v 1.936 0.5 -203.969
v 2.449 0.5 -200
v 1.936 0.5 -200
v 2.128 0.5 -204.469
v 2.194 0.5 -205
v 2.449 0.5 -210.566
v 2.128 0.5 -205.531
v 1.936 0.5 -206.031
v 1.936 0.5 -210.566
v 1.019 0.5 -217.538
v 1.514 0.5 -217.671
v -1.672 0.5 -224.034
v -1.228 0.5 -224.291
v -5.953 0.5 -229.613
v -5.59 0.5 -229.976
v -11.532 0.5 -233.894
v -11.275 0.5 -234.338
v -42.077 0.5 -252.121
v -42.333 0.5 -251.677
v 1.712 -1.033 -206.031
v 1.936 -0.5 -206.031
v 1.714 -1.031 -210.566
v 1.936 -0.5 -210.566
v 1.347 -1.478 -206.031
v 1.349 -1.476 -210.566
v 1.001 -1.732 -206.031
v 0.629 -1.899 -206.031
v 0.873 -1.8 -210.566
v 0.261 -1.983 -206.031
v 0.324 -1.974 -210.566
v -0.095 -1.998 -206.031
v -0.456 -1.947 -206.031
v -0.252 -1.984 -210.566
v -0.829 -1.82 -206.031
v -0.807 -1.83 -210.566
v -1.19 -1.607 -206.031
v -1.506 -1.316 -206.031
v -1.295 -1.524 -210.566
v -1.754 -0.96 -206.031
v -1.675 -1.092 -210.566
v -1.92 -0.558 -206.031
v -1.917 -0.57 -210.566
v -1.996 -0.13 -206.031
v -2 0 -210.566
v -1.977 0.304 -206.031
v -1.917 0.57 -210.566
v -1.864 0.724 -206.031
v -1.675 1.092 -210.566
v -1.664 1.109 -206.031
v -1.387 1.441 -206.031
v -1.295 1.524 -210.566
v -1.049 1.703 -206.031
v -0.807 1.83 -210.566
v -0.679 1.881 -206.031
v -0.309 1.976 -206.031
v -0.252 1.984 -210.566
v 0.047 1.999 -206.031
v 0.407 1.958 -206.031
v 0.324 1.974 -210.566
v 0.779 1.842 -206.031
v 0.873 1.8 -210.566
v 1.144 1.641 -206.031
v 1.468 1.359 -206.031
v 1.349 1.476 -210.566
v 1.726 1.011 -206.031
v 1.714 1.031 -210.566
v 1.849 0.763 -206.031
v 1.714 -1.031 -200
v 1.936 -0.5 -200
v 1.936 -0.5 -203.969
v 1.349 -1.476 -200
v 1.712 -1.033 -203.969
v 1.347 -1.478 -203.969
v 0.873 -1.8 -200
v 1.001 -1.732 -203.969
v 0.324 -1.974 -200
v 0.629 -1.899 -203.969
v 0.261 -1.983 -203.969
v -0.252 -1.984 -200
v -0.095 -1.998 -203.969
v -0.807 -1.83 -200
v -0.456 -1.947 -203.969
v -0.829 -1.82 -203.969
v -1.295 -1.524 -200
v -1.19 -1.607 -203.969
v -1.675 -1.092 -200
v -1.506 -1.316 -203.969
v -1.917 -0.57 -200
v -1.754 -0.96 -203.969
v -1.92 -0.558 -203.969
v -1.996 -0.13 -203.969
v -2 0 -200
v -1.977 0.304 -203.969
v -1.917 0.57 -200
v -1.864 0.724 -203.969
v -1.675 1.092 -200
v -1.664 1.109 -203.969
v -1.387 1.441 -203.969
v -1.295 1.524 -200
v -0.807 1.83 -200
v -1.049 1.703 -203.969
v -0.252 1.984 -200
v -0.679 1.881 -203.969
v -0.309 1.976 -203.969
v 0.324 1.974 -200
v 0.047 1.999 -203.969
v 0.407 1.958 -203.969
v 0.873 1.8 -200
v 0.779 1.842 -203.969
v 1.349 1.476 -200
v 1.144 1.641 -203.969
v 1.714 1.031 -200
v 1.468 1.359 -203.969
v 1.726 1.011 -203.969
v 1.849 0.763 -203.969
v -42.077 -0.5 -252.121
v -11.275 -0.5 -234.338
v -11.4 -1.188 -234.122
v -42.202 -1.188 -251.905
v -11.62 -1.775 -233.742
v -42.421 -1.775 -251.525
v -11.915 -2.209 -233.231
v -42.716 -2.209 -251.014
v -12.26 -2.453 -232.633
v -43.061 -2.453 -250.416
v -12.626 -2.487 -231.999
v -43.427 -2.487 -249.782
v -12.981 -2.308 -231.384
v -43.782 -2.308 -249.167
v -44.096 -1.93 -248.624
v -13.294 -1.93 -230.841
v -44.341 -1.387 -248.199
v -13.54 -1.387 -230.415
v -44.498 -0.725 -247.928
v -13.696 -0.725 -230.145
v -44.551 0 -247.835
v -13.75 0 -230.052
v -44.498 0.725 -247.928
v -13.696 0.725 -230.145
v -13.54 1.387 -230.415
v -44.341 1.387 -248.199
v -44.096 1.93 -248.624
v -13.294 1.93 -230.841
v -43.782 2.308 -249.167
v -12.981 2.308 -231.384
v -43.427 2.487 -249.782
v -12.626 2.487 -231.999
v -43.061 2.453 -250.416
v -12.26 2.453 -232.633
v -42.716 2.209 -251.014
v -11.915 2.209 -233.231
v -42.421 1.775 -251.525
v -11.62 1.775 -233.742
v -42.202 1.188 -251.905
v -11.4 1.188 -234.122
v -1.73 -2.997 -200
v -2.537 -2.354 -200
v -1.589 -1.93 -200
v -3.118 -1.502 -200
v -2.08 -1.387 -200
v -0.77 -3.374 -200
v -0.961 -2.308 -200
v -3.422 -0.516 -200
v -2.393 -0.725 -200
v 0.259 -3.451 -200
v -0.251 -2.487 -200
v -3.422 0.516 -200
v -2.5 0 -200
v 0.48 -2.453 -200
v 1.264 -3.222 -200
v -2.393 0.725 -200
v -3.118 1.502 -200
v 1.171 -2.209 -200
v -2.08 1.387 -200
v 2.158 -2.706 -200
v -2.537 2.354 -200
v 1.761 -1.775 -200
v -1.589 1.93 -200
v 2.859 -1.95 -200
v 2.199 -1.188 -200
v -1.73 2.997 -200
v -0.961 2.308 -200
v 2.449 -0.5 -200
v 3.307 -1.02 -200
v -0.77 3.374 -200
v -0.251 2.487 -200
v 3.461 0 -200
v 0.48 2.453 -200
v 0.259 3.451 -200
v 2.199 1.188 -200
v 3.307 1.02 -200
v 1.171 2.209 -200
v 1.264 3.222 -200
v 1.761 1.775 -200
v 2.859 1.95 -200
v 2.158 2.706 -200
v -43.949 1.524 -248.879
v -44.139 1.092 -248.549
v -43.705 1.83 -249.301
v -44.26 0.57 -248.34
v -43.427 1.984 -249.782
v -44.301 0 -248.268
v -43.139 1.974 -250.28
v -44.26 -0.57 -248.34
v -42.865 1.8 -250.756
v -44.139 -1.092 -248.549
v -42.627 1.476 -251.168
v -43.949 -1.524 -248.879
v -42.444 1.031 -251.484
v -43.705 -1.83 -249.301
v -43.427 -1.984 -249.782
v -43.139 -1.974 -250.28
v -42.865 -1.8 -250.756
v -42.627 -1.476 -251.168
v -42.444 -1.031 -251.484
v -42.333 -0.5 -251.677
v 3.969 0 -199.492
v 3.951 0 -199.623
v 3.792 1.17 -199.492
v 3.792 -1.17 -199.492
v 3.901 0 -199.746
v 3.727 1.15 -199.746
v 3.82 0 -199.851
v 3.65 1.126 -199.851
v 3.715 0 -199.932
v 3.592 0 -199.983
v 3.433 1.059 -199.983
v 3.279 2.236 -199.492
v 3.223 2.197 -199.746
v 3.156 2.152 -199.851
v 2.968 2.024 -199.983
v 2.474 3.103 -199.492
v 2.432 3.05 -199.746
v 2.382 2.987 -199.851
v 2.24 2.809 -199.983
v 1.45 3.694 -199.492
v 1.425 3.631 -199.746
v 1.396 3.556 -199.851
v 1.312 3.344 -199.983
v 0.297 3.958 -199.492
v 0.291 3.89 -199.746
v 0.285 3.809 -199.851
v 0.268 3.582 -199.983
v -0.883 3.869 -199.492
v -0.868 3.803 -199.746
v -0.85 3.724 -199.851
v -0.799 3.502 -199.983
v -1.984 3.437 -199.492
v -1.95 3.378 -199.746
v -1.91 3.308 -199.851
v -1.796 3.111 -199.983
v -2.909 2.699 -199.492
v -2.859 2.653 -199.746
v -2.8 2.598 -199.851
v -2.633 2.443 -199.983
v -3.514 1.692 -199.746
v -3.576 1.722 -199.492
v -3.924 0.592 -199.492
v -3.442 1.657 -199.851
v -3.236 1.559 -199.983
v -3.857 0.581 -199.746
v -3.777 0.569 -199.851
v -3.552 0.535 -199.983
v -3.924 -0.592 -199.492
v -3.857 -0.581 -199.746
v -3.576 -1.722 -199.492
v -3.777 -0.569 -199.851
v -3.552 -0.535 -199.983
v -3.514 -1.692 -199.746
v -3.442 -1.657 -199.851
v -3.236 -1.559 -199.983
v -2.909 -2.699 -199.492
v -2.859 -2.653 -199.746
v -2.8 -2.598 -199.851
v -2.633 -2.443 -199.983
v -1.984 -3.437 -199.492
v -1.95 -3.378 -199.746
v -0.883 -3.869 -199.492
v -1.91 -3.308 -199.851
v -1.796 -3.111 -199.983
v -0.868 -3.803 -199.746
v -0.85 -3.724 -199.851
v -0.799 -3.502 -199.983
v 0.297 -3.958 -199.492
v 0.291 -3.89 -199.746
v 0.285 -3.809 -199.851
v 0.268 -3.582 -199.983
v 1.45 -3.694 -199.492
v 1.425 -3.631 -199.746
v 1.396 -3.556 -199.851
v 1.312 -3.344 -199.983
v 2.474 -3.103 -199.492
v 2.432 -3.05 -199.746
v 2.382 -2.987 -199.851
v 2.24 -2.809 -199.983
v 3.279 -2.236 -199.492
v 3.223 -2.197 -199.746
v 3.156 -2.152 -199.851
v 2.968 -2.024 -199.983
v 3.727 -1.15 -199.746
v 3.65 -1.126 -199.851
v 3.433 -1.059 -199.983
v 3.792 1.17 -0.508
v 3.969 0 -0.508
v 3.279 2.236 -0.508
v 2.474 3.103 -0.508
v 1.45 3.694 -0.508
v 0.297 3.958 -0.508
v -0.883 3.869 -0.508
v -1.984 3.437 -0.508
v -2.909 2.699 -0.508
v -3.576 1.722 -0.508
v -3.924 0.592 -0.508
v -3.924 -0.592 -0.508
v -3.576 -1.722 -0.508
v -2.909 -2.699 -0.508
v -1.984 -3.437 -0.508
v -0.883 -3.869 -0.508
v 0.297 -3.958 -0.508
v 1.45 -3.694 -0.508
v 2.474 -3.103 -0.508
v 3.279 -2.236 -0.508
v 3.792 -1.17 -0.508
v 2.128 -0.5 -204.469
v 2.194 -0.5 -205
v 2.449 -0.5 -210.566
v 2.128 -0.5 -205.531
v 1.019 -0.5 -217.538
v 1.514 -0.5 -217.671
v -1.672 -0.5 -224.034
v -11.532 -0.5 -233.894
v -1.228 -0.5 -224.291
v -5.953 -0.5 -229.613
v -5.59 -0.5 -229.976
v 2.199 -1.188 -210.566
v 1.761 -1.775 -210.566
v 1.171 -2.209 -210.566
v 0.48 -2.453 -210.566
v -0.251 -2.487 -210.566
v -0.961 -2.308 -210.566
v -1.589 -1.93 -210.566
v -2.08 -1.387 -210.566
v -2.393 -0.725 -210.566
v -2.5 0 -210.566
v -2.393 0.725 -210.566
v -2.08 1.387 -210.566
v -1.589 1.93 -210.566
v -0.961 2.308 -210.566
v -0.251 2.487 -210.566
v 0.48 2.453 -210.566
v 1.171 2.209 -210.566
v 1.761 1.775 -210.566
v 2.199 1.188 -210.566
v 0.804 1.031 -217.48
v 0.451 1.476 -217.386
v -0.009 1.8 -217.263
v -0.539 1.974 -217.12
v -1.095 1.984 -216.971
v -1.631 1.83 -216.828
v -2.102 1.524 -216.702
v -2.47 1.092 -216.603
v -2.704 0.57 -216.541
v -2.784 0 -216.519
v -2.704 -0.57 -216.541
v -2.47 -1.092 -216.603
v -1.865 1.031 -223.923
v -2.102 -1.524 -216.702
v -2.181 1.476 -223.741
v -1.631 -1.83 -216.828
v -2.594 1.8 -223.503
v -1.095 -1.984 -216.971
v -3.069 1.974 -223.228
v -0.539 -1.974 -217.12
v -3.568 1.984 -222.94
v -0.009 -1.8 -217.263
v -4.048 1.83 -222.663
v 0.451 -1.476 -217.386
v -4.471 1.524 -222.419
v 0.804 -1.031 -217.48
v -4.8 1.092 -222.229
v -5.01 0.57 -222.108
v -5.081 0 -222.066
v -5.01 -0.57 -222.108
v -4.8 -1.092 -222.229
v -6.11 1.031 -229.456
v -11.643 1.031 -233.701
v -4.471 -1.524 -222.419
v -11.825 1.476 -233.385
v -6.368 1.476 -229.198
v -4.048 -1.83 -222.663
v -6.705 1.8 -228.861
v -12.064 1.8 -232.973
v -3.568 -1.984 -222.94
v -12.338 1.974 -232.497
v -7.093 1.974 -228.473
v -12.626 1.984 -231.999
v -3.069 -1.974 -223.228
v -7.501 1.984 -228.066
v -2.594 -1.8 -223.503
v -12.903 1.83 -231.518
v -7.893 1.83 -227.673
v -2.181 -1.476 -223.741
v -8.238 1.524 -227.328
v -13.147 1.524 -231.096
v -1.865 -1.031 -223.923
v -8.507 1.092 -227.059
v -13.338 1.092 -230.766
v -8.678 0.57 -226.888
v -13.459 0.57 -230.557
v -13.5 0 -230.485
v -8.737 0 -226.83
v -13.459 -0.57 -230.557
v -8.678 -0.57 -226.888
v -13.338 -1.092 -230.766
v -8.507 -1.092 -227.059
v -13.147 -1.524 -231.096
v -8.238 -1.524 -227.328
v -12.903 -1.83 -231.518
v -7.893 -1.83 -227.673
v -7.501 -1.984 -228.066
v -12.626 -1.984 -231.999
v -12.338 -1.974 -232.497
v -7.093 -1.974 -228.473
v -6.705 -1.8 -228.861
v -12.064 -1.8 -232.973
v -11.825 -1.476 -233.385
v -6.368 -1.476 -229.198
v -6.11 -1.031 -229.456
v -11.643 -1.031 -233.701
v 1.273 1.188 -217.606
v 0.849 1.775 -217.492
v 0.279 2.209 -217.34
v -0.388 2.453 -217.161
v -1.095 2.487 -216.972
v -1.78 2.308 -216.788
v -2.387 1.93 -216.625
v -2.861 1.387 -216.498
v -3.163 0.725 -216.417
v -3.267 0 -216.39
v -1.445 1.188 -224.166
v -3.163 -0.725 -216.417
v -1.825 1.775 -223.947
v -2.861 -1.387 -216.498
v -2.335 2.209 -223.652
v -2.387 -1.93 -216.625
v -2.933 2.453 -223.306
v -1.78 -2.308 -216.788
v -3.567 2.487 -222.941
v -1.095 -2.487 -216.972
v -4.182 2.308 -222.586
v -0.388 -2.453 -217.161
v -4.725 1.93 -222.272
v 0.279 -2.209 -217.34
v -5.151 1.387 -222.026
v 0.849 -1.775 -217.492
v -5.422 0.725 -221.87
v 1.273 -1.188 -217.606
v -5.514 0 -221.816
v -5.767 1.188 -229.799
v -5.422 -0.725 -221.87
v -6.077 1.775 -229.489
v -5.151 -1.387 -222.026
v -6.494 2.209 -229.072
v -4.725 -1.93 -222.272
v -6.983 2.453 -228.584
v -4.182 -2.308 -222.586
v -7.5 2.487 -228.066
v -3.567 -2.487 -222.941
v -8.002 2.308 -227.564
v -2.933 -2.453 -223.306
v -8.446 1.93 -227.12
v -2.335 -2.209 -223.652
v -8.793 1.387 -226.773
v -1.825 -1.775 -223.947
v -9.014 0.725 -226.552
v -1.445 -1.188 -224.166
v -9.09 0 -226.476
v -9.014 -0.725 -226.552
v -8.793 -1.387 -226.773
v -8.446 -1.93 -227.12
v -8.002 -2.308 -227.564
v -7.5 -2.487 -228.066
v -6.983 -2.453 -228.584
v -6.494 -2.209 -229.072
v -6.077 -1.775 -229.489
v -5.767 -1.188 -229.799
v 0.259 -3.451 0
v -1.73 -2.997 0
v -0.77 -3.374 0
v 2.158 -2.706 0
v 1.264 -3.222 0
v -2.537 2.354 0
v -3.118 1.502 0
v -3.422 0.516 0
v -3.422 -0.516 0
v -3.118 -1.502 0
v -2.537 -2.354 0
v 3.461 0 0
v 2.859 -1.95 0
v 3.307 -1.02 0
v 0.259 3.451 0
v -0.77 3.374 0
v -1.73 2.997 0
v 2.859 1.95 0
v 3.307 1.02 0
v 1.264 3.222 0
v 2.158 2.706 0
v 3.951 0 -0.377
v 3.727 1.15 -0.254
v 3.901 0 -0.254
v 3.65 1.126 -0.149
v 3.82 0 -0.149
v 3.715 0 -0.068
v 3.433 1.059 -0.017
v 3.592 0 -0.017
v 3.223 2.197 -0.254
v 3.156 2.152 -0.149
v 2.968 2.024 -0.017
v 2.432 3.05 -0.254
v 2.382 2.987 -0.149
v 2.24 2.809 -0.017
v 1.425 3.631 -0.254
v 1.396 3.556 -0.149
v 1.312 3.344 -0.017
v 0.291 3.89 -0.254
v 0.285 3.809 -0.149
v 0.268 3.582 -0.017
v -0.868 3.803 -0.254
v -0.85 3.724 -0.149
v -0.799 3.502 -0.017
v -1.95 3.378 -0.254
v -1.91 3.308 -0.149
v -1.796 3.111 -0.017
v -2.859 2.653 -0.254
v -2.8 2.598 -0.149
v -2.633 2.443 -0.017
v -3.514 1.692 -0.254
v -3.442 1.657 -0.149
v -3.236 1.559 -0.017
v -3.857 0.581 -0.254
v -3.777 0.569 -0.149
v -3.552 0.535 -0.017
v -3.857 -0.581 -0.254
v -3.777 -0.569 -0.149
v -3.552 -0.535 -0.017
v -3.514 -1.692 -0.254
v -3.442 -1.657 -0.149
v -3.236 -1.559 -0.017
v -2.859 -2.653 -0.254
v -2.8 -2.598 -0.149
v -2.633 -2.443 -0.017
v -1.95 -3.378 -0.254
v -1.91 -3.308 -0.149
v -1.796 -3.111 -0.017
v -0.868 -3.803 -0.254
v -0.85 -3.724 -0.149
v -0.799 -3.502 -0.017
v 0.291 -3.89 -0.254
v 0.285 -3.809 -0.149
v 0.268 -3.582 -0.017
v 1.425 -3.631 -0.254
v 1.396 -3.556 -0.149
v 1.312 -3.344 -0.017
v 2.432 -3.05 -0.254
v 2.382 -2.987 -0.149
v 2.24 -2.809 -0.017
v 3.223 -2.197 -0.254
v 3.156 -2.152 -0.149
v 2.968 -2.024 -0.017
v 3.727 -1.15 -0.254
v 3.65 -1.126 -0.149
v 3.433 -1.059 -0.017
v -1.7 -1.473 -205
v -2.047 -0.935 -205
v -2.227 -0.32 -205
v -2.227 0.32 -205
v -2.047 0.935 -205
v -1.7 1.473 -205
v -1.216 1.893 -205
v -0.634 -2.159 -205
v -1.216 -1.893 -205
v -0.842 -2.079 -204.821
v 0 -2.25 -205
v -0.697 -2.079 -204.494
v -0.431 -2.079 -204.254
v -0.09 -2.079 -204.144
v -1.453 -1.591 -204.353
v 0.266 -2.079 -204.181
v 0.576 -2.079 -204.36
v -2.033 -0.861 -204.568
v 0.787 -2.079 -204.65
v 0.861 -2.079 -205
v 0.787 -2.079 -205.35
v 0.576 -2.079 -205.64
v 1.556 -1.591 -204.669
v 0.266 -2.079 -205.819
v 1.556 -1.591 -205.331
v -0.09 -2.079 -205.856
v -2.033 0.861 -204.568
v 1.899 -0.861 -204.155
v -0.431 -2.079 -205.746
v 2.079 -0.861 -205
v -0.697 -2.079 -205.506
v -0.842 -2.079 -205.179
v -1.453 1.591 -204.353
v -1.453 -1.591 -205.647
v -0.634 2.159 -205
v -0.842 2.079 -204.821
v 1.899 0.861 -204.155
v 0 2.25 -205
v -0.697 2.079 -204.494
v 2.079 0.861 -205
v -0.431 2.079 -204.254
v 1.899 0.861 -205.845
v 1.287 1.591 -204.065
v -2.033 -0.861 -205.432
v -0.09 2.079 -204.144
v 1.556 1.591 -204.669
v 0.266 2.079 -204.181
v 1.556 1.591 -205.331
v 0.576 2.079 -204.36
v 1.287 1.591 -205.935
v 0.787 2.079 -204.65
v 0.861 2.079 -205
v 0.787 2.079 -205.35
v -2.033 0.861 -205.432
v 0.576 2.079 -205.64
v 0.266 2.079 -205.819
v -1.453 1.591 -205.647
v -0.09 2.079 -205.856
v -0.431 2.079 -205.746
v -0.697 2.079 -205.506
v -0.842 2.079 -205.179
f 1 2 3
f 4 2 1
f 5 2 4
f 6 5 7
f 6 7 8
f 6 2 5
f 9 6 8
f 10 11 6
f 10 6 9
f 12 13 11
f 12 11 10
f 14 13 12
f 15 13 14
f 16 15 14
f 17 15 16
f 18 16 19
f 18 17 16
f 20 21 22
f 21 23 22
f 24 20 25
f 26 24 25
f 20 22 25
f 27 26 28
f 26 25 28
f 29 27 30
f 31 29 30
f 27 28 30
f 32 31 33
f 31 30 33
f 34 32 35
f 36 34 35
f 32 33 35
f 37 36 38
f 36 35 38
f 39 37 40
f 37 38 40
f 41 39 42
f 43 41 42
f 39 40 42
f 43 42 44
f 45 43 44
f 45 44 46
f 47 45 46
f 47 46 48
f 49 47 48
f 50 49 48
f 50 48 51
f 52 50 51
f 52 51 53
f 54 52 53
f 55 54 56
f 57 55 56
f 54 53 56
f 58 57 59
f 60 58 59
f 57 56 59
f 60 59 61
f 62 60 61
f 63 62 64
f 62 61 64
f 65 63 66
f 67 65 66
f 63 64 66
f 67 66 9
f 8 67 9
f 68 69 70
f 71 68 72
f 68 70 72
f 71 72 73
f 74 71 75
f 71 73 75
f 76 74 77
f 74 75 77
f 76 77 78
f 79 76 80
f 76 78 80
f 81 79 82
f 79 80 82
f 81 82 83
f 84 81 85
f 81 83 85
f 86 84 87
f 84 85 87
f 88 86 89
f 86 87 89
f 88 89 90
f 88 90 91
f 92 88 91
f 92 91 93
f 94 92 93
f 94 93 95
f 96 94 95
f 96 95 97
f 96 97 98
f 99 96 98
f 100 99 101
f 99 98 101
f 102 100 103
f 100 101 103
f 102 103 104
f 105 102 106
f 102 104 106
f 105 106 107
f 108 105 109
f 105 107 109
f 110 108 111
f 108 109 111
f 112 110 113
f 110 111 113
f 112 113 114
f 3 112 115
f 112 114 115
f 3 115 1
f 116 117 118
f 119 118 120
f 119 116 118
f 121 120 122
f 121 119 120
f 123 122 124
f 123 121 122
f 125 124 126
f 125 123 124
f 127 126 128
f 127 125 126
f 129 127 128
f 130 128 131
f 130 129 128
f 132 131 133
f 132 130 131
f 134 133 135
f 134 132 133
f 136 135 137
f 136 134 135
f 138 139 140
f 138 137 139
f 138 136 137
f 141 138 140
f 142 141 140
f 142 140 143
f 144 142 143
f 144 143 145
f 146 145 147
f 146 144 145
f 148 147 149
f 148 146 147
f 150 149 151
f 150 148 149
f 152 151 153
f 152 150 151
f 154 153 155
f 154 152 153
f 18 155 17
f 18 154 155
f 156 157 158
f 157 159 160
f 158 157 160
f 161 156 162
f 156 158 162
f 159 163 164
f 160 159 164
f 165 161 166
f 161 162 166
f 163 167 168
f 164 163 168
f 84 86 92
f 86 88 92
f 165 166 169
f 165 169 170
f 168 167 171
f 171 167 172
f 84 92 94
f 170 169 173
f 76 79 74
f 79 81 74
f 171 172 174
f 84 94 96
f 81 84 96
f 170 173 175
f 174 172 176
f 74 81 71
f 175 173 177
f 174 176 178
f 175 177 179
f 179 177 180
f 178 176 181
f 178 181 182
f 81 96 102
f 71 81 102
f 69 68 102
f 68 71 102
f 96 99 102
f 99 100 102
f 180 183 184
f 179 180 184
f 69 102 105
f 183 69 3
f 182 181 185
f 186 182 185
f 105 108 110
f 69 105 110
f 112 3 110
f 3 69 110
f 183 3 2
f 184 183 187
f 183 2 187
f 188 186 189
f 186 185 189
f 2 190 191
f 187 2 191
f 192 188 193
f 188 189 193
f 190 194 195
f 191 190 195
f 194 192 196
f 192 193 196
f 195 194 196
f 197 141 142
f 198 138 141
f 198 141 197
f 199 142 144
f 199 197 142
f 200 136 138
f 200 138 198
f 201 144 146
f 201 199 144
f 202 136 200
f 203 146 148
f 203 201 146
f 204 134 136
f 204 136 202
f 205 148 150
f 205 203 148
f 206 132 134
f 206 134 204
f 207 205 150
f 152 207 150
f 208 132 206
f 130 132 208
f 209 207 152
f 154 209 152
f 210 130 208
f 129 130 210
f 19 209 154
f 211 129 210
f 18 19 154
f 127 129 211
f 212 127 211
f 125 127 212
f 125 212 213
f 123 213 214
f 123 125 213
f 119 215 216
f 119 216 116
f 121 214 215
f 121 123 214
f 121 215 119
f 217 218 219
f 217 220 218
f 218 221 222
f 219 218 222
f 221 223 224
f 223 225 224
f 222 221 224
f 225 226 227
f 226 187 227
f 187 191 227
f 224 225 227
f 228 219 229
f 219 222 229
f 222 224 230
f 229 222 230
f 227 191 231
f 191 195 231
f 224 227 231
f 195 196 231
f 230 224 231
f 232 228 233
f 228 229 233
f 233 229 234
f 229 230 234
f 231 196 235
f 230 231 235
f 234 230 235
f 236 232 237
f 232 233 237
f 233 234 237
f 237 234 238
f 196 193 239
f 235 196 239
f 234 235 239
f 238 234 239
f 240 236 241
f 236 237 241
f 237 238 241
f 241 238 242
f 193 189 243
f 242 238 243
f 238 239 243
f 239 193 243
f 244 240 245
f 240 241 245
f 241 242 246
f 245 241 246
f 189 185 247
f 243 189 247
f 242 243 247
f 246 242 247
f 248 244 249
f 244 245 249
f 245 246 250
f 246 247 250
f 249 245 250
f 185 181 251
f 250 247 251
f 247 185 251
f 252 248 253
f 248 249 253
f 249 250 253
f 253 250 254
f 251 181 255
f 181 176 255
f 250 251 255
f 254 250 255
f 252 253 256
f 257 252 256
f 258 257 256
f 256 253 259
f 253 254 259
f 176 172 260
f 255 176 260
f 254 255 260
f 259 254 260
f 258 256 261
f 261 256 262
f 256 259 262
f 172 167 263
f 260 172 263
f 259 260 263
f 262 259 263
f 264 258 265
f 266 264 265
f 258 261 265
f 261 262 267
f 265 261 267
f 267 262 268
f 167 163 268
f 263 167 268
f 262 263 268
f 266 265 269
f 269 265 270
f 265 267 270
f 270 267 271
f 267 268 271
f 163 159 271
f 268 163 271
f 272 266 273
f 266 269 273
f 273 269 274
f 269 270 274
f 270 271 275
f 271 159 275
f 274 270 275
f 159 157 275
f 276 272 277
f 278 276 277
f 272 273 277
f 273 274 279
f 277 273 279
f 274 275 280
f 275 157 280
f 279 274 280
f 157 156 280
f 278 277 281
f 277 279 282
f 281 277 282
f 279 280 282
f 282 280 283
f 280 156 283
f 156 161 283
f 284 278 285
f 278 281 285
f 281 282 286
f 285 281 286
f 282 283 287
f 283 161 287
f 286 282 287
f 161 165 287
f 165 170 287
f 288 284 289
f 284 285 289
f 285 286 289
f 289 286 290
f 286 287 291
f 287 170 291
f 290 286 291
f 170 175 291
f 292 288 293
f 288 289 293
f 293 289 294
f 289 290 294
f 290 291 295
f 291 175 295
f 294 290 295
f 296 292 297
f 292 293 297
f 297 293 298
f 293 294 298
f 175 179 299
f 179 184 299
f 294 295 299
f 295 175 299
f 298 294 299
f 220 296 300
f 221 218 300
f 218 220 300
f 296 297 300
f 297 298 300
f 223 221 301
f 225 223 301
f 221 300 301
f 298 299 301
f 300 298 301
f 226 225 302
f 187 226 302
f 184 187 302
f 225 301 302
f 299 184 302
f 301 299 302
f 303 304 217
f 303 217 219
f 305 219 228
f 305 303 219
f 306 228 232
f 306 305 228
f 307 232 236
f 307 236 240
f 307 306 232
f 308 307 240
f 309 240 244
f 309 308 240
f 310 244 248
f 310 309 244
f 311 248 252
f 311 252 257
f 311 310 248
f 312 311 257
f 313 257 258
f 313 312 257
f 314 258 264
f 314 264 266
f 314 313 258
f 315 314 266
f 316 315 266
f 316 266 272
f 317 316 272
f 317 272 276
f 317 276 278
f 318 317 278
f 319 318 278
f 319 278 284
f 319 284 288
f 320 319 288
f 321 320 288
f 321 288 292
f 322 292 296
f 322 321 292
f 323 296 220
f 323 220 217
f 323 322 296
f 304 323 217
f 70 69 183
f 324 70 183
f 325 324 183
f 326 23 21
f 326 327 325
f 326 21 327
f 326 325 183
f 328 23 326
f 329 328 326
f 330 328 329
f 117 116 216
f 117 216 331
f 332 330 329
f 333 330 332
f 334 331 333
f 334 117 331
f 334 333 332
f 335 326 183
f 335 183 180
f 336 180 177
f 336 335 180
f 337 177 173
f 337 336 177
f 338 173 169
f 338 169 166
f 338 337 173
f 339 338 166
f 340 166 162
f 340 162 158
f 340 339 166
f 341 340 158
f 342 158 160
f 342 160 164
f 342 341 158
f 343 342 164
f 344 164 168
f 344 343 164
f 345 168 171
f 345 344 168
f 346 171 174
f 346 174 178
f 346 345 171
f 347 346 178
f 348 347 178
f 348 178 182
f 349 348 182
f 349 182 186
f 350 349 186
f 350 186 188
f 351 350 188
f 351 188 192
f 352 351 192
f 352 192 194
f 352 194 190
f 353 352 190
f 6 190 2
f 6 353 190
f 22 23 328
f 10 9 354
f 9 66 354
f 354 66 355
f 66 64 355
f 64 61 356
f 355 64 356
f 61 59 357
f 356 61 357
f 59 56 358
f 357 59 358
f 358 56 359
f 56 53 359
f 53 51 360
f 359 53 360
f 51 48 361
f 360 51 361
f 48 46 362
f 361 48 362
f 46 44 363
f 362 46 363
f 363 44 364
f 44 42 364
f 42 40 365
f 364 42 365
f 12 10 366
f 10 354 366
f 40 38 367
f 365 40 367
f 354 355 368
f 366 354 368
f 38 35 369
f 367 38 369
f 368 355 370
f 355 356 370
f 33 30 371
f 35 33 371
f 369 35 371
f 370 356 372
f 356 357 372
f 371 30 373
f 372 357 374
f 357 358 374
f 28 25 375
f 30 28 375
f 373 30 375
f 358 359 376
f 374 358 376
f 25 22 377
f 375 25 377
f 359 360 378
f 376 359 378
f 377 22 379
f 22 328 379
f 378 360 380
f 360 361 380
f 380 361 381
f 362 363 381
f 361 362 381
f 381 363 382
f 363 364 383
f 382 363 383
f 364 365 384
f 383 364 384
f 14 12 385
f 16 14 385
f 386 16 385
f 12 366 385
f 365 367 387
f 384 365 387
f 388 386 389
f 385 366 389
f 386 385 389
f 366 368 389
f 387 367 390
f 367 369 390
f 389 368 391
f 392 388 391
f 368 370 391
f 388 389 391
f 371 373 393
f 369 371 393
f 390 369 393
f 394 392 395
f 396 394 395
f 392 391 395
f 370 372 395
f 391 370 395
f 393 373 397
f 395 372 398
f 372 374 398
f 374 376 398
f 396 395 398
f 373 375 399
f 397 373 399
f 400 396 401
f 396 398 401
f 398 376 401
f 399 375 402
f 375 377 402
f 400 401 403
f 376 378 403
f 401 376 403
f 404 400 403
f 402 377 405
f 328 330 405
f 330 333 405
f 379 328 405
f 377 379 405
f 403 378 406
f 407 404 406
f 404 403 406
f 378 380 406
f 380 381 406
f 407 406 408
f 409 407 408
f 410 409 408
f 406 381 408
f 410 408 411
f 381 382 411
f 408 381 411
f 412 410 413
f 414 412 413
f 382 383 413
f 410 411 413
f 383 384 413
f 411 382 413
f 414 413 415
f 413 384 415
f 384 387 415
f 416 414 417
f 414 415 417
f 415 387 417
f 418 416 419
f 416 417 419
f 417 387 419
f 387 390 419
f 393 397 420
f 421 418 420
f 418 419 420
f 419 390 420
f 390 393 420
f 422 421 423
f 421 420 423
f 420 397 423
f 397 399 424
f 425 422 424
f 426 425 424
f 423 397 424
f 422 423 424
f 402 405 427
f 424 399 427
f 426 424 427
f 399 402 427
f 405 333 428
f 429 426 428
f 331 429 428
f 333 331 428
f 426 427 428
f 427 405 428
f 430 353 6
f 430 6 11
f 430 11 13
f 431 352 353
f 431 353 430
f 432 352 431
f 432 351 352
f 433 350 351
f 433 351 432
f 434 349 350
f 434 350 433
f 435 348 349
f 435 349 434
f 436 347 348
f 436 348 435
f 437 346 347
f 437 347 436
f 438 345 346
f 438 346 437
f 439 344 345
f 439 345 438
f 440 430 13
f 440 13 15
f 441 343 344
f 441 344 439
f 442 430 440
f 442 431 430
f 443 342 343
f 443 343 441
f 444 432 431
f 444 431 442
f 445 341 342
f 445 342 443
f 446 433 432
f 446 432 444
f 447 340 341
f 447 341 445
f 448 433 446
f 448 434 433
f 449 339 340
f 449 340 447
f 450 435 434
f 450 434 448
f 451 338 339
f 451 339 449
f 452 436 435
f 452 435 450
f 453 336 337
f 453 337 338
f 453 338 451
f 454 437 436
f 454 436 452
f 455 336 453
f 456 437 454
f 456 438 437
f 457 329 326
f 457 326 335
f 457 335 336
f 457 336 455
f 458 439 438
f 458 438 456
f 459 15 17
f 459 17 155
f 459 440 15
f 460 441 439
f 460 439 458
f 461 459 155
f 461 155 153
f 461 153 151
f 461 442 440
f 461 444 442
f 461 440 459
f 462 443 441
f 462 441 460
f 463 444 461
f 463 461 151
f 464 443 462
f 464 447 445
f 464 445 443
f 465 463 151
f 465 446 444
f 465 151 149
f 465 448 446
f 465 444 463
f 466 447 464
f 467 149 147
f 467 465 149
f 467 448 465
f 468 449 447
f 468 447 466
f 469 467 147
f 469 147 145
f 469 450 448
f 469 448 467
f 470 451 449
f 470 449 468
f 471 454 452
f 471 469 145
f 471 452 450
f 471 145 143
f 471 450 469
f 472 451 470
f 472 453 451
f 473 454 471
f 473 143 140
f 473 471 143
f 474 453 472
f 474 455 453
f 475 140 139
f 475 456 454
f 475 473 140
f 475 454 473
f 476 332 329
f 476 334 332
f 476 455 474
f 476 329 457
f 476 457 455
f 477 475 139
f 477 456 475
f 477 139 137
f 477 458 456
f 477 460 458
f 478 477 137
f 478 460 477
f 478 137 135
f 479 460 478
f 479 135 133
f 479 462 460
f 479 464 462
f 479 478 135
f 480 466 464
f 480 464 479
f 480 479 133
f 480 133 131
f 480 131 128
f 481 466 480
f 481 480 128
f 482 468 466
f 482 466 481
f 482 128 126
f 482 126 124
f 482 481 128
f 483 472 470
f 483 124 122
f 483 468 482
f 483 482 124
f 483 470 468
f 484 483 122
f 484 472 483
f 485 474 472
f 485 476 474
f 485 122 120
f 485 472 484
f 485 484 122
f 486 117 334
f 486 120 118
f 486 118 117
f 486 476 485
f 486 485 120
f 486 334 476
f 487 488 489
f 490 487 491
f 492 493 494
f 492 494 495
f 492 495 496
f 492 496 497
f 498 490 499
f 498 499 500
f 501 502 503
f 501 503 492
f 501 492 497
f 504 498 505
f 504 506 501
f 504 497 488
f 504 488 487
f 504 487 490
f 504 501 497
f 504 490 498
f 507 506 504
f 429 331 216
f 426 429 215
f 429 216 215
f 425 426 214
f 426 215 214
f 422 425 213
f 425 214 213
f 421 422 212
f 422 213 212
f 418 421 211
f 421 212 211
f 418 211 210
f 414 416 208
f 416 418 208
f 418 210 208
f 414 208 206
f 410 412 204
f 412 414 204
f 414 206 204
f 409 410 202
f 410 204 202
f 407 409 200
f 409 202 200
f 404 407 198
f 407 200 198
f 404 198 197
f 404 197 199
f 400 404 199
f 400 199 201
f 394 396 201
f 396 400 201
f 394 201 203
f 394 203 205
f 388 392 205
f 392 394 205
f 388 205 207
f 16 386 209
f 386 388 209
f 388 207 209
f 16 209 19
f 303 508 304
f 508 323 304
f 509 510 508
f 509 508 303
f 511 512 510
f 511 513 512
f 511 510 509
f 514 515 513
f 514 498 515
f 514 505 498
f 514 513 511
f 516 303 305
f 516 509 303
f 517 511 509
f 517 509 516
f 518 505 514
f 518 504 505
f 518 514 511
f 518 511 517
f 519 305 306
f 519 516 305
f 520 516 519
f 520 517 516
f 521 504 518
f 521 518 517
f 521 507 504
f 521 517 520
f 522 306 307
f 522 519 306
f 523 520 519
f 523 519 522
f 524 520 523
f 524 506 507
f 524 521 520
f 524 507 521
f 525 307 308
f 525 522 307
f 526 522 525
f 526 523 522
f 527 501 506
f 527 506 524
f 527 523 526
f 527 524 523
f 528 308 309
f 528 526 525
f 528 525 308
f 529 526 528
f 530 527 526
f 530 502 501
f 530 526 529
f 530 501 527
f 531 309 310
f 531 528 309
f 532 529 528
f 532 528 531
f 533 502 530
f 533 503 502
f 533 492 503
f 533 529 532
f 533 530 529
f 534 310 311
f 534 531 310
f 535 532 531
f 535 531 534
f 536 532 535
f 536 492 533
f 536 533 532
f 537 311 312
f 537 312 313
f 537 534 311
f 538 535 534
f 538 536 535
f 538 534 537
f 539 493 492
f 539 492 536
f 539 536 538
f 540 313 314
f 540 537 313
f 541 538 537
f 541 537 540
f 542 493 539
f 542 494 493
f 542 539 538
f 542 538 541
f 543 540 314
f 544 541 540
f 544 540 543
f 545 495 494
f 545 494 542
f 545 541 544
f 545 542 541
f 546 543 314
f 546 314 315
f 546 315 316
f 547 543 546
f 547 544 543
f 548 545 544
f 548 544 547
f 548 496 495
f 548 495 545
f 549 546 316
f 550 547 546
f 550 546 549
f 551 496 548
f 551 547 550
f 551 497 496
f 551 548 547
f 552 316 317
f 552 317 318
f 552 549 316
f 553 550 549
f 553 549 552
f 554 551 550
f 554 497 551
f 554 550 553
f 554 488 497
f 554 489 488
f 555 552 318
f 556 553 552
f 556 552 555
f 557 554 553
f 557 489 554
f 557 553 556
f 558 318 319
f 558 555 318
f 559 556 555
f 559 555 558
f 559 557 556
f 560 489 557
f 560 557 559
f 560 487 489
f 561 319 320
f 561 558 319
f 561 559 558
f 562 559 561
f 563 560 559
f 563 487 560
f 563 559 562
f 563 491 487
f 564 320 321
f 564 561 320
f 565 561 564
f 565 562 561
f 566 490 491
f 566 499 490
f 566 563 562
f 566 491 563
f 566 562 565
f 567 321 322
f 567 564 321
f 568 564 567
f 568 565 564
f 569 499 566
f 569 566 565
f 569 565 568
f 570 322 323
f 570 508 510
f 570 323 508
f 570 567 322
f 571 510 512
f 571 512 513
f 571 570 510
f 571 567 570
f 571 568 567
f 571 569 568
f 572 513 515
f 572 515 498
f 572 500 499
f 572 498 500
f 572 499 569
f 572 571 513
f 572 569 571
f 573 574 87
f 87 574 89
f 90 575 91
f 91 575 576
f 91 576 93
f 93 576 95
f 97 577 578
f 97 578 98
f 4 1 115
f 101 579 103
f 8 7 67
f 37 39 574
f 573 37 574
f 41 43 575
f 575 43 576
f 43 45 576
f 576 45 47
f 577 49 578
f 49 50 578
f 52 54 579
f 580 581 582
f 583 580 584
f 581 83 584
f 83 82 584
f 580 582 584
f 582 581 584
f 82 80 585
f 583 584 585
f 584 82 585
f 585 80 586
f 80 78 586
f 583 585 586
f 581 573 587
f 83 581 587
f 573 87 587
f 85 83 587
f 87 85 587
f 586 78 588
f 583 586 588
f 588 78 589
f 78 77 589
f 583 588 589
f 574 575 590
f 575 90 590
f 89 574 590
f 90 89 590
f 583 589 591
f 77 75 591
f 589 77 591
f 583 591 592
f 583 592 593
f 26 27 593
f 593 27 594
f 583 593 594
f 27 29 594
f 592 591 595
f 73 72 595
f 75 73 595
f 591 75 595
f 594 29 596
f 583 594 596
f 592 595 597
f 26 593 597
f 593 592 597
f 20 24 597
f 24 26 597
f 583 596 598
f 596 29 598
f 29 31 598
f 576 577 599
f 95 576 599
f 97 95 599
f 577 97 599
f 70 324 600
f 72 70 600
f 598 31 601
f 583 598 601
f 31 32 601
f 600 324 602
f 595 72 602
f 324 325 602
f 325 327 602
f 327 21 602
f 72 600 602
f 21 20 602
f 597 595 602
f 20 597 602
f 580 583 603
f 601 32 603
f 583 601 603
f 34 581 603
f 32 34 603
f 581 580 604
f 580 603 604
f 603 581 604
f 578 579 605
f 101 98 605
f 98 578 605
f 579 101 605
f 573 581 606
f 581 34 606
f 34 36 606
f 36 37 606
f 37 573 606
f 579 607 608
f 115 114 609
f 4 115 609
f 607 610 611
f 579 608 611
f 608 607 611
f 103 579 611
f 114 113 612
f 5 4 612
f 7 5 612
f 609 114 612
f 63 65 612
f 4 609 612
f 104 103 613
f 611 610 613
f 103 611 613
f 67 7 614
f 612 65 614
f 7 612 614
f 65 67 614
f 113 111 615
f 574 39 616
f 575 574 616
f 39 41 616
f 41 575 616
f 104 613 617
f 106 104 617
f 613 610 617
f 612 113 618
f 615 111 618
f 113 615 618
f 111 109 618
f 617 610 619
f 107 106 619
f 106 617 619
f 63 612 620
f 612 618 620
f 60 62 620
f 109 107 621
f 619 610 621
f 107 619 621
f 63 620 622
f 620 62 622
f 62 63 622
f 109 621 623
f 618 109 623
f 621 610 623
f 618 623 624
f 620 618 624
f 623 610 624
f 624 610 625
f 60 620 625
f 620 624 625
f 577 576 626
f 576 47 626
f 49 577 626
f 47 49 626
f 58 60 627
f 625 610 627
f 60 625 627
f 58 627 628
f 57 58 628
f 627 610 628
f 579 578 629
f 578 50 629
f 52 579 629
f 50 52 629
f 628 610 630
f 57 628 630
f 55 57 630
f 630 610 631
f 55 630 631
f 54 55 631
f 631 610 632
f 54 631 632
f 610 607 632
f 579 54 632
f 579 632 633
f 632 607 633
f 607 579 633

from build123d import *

# Parameters (mm, degrees)
SKETCH1_R      = 3.96875
EXTRUDE1_DEPTH = 200
FILLET1_R      = 0.508


with BuildPart() as part:
    # Sketch1 → Extrude1 (new body)
    with BuildSketch(Plane.XY):
        Circle(SKETCH1_R)
    extrude(amount=-EXTRUDE1_DEPTH)

    # Fillet1
    fillet1_edges = [part.edges().sort_by_distance(p)[0] for p in [
        (-3.96875, 0, 0),
        (-3.96875, 0, -200),
    ]]
    fillet(fillet1_edges, radius=FILLET1_R)

    # Sweep1: sweep along a path in Sketch2
    with BuildLine(Plane(origin=(0, 0, 0), x_dir=(1, 0, 0), z_dir=(0, 1, 0))) as sweep1_path:
        Line((0, 200), (0, 210.56624327))
        ThreePointArc((0, 210.56624327), (-3.349364905, 223.06624327), (-12.5, 232.216878365))
        Line((-12.5, 232.216878365), (-43.301270189, 250))
    # Sketch3 → Sweep1 (sweep)
    with BuildSketch(Plane(origin=(0, 0, -200), x_dir=(-1, 0, 0), z_dir=(0, 0, -1))):
        with BuildLine():
            Line((-2.449489743, 0.5), (-1.936491673, 0.5))
            ThreePointArc((-1.936491673, 0.5), (2, 0), (-1.936491673, -0.5))
            Line((-1.936491673, -0.5), (-2.449489743, -0.5))
            ThreePointArc((-2.449489743, -0.5), (2.5, 0), (-2.449489743, 0.5))
        make_face()
    sweep(path=sweep1_path.line)

    # Sketch4 → Cut-Revolve3 (revolve, cut)
    with BuildSketch(Plane(origin=(0, 0, -205), x_dir=(-1, 0, 0), z_dir=(0, 0, -1))):
        with BuildLine():
            Line((0, 2.25), (0, -2.25))
            ThreePointArc((0, -2.25), (2.25, 0), (0, 2.25))
        make_face()
    revolve(axis=Axis((0, 0, -205), (0, 1, 0)), mode=Mode.SUBTRACT)


solid = part.part
